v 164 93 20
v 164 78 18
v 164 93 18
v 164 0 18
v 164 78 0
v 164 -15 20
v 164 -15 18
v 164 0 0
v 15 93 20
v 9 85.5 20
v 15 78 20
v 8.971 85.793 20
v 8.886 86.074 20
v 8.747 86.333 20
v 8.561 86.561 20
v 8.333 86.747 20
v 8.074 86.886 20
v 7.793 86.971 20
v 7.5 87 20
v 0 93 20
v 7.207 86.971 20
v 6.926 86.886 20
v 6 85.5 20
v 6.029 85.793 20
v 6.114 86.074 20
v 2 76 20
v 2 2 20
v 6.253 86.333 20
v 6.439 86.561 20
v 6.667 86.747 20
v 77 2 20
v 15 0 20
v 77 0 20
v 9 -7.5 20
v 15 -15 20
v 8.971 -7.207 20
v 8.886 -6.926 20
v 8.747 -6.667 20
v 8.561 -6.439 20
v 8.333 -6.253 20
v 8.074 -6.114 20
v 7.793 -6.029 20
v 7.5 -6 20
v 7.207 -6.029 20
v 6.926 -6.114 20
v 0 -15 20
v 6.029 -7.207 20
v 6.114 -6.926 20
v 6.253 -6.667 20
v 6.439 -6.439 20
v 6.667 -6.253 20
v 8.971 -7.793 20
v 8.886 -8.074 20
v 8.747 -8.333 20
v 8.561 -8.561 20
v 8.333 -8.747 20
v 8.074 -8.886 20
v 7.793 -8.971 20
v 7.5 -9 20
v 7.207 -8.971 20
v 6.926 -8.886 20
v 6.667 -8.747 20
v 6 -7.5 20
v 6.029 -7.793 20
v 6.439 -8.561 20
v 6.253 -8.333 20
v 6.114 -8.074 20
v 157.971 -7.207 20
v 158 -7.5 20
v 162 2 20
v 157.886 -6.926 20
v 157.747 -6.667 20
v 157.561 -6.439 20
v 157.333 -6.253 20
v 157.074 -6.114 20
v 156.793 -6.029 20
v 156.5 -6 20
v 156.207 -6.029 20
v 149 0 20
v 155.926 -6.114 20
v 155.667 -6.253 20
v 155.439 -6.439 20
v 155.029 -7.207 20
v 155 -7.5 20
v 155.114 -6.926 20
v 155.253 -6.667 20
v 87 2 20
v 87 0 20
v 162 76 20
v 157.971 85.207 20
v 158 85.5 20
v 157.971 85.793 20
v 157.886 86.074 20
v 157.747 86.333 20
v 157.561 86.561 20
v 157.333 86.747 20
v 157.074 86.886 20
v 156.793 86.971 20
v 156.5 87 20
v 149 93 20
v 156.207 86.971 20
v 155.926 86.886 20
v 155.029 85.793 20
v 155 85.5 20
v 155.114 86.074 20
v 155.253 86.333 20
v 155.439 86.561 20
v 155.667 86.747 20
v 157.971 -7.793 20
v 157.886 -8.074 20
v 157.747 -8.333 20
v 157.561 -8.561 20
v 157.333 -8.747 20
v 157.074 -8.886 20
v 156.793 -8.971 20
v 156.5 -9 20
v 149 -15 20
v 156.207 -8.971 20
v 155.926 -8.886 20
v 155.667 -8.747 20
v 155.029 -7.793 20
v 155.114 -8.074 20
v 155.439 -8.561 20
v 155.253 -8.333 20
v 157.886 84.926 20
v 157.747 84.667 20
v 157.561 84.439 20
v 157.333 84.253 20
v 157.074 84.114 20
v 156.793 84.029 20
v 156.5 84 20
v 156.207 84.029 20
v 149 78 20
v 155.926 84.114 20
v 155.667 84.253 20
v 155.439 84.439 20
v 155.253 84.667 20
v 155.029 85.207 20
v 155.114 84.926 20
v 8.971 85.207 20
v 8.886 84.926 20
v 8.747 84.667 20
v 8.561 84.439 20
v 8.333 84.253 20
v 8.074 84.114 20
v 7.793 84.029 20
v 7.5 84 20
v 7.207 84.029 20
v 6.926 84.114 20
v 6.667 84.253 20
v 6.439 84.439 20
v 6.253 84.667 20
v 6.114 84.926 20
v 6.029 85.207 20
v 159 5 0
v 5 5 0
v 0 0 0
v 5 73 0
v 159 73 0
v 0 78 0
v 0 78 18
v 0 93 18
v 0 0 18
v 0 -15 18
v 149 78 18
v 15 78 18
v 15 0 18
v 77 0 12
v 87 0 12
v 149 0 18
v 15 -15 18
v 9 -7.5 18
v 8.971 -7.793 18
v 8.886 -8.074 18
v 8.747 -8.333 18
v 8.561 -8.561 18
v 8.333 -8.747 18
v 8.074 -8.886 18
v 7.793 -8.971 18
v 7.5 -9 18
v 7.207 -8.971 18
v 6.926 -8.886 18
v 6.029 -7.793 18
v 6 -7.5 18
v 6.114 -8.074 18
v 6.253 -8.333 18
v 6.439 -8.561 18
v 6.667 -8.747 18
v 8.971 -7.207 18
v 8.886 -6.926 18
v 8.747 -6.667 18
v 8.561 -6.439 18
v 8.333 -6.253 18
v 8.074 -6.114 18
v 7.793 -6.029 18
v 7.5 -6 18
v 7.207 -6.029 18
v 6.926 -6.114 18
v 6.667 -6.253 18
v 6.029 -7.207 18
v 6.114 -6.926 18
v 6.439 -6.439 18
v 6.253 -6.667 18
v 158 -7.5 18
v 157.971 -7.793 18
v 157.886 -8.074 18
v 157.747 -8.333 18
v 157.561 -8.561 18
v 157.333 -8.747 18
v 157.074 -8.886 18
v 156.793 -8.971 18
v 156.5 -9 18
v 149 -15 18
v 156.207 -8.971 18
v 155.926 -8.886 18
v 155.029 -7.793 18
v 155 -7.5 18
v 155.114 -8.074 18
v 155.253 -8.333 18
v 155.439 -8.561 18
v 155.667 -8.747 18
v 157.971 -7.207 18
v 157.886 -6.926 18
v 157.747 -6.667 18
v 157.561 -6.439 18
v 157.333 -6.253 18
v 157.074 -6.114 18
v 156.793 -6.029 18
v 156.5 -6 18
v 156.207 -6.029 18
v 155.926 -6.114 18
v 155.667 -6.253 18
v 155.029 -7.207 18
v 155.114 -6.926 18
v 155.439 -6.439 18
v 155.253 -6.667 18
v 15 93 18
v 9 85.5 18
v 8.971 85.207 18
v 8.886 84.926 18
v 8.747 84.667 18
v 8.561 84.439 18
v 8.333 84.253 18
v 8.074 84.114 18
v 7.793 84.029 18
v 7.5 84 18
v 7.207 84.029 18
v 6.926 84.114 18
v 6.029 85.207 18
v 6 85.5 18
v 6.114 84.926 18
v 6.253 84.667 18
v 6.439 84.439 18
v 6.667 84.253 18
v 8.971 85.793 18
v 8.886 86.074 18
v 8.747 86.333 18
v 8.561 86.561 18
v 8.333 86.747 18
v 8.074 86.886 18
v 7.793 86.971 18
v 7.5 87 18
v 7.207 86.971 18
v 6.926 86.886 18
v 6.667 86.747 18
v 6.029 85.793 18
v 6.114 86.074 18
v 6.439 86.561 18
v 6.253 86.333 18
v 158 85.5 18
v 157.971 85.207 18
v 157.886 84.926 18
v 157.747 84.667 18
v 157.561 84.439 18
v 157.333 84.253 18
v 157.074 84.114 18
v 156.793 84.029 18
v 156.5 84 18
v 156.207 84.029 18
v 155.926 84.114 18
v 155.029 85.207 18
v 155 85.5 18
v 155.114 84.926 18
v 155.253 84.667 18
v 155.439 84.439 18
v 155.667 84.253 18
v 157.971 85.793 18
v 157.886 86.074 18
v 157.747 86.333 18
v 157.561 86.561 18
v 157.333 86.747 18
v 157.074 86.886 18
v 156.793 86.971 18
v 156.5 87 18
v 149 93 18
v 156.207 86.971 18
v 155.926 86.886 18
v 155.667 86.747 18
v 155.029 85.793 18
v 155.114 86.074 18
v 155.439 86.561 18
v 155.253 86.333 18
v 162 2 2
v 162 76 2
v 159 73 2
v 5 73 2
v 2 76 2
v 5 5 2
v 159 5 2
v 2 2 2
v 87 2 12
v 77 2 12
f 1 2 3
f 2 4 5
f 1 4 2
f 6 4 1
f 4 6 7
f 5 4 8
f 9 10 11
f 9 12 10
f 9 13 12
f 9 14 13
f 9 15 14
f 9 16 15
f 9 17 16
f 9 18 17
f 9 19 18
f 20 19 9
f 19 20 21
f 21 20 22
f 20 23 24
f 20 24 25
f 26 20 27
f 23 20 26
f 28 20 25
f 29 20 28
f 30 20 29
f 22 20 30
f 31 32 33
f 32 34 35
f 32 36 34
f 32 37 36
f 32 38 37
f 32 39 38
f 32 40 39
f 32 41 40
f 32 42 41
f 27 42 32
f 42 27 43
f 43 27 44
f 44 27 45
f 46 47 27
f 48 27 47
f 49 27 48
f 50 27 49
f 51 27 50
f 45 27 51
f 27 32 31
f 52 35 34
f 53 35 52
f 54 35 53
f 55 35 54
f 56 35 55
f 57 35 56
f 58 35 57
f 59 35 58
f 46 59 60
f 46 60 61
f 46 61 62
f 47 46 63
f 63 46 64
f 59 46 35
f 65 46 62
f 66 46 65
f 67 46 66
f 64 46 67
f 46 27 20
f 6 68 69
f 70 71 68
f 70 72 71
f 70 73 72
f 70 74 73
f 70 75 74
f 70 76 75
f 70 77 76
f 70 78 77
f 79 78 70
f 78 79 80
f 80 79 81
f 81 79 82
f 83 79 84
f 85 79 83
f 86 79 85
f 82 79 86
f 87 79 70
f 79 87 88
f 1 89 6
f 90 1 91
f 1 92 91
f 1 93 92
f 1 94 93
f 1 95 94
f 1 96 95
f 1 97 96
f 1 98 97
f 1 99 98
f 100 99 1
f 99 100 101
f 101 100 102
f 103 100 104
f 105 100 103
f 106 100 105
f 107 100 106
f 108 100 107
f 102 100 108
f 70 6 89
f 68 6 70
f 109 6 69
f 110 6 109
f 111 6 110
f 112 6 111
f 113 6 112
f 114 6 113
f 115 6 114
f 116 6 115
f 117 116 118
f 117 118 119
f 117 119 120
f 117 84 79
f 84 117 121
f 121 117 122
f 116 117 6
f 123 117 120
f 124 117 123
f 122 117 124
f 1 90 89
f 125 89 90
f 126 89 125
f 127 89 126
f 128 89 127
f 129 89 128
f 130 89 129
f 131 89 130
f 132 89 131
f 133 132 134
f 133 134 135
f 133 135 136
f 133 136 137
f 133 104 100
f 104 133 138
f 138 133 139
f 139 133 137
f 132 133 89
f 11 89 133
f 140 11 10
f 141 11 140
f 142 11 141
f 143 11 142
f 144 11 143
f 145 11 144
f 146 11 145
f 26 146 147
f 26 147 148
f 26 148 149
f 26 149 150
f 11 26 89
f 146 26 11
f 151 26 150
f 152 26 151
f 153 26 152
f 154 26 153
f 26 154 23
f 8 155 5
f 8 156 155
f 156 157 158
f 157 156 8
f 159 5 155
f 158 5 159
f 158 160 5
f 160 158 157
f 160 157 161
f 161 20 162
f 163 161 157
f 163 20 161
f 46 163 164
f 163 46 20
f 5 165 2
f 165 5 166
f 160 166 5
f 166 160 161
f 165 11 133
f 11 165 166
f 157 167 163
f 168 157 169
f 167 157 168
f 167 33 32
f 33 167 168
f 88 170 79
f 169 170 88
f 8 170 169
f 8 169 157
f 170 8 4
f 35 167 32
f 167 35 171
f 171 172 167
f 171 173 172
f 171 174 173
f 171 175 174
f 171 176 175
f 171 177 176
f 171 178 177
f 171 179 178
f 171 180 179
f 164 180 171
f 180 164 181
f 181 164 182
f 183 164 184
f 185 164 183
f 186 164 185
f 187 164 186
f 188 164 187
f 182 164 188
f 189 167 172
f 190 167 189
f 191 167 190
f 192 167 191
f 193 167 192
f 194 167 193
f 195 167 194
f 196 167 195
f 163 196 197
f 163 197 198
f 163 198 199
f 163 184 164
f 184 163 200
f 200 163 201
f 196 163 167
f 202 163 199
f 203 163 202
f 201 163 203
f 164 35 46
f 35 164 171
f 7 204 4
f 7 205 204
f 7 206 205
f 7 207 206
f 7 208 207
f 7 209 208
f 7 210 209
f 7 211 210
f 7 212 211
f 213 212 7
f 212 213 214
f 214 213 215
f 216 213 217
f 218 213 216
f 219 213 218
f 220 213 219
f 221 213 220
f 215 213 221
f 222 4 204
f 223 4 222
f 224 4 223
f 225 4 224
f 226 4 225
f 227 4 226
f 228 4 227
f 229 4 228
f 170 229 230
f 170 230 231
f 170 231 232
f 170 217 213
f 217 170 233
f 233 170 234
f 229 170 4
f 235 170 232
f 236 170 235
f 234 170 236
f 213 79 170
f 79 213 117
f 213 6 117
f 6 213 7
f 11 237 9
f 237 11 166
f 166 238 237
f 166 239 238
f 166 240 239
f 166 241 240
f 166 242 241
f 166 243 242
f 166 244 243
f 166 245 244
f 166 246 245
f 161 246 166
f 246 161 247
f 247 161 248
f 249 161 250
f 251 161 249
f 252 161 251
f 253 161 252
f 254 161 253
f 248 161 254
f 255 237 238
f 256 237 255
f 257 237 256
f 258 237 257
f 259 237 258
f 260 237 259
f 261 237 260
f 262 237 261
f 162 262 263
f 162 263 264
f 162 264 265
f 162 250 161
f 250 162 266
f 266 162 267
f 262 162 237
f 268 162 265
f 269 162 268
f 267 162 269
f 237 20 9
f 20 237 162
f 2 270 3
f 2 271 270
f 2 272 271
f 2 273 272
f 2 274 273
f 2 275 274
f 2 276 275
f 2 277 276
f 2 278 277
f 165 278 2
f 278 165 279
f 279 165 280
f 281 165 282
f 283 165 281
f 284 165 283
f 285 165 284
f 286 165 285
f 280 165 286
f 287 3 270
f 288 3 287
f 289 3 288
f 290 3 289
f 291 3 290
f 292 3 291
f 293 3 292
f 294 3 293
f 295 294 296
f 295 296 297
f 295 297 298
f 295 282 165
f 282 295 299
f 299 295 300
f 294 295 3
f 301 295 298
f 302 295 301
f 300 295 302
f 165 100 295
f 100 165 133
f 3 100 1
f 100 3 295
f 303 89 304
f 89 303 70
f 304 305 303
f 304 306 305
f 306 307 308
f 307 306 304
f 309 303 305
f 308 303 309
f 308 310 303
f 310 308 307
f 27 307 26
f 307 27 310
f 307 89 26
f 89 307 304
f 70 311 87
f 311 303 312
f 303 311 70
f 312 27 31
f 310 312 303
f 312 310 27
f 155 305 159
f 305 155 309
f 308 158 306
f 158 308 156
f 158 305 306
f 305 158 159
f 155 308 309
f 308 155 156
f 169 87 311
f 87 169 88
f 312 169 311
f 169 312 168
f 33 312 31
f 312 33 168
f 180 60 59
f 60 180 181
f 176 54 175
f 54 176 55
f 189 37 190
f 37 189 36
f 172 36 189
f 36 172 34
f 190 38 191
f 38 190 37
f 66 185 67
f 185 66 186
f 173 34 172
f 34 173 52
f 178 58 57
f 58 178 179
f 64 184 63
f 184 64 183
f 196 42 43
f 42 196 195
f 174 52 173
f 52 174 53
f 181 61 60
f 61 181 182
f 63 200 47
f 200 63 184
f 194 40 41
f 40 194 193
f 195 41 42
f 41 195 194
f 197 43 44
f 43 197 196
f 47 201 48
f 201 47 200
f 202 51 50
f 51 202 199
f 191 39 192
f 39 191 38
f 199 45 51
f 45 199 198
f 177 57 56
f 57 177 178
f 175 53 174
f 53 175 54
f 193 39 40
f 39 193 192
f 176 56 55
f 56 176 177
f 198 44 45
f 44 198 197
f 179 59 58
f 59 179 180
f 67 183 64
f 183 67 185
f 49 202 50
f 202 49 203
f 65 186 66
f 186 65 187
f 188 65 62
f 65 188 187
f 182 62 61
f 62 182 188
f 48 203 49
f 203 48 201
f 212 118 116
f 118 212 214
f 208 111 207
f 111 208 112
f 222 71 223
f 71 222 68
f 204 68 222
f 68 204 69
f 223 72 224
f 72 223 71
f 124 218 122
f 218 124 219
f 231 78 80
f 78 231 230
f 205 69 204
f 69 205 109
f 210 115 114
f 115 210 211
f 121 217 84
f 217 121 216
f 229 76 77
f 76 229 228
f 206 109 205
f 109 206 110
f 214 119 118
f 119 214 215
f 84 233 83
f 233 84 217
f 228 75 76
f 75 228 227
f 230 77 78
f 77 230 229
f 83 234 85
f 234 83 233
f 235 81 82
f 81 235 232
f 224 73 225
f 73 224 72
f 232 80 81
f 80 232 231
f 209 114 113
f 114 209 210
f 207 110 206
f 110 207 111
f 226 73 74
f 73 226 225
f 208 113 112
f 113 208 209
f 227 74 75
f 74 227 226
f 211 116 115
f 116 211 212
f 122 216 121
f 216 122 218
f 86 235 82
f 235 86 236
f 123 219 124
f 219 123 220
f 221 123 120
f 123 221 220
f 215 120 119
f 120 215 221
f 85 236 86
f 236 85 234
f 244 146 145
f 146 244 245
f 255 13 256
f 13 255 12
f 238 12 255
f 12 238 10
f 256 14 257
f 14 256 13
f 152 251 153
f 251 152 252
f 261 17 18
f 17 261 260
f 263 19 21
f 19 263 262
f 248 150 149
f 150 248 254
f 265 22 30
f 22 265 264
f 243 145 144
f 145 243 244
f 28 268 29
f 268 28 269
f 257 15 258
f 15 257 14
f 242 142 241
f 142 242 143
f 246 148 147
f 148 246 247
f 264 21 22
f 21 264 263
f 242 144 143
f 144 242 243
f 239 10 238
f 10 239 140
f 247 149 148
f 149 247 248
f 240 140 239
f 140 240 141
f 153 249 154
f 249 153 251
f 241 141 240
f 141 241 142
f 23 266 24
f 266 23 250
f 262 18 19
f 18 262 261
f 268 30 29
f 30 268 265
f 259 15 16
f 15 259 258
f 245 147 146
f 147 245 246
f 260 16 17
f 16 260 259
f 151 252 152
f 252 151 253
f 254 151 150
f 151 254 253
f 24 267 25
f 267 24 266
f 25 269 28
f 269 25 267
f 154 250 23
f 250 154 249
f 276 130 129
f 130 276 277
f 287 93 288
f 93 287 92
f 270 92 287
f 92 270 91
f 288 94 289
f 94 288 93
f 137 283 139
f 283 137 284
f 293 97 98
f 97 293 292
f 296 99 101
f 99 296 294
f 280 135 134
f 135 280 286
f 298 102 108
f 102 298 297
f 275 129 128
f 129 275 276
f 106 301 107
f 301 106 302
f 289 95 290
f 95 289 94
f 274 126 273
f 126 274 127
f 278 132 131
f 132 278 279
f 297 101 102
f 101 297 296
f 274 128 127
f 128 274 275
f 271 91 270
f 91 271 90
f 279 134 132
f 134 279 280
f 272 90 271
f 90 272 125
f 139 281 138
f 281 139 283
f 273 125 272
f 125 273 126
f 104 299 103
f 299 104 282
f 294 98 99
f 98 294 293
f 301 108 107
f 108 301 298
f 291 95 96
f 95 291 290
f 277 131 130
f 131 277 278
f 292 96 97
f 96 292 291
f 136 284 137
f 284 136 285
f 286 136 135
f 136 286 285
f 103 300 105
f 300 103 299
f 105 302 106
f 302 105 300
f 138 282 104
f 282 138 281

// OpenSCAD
// Box enclosure for 160x74x18mm object

// Inner dimensions (the object to enclose)
inner_length = 160;
inner_width = 74;
inner_height = 18;

// Wall thickness
wall = 2;

// Bottom hole inset from inner walls
hole_inset = 3;

// Side hole dimensions
side_hole_width = 10;
side_hole_height = 8;

// Overhang dimensions
overhang_width = 15;
overhang_length = 15;

// Screw hole diameter
screw_hole_d = 3;

// Outer dimensions
outer_length = inner_length + 2 * wall;
outer_width = inner_width + 2 * wall;
outer_height = inner_height + wall; // wall on bottom only, open top

// Bottom hole dimensions
hole_length = inner_length - 2 * hole_inset;
hole_width = inner_width - 2 * hole_inset;

// Overhang positions along X (flush to edges)
overhang_x1 = 0;
overhang_x2 = outer_length - overhang_width;

difference() {
    union() {
        // Outer shell
        cube([outer_length, outer_width, outer_height]);

        // Left side overhangs (Y=0, extending in -Y)
        translate([overhang_x1, -overhang_length, outer_height - wall])
            cube([overhang_width, overhang_length, wall]);
        translate([overhang_x2, -overhang_length, outer_height - wall])
            cube([overhang_width, overhang_length, wall]);

        // Right side overhangs (Y=outer_width, extending in +Y)
        translate([overhang_x1, outer_width, outer_height - wall])
            cube([overhang_width, overhang_length, wall]);
        translate([overhang_x2, outer_width, outer_height - wall])
            cube([overhang_width, overhang_length, wall]);
    }

    // Inner cavity
    translate([wall, wall, wall])
        cube([inner_length, inner_width, inner_height + 1]);

    // Square hole in the bottom
    translate([wall + hole_inset, wall + hole_inset, -1])
        cube([hole_length, hole_width, wall + 2]);

    // Hole on the long side (front), centered horizontally, near top edge
    translate([outer_length / 2 - side_hole_width / 2, -1, outer_height - side_hole_height])
        cube([side_hole_width, wall + 2, side_hole_height + 1]);

    // Screw holes in overhangs - left side
    translate([overhang_x1 + overhang_width / 2, -overhang_length / 2, outer_height - wall - 1])
        cylinder(h = wall + 2, d = screw_hole_d, $fn = 32);
    translate([overhang_x2 + overhang_width / 2, -overhang_length / 2, outer_height - wall - 1])
        cylinder(h = wall + 2, d = screw_hole_d, $fn = 32);

    // Screw holes in overhangs - right side
    translate([overhang_x1 + overhang_width / 2, outer_width + overhang_length / 2, outer_height - wall - 1])
        cylinder(h = wall + 2, d = screw_hole_d, $fn = 32);
    translate([overhang_x2 + overhang_width / 2, outer_width + overhang_length / 2, outer_height - wall - 1])
        cylinder(h = wall + 2, d = screw_hole_d, $fn = 32);
}
